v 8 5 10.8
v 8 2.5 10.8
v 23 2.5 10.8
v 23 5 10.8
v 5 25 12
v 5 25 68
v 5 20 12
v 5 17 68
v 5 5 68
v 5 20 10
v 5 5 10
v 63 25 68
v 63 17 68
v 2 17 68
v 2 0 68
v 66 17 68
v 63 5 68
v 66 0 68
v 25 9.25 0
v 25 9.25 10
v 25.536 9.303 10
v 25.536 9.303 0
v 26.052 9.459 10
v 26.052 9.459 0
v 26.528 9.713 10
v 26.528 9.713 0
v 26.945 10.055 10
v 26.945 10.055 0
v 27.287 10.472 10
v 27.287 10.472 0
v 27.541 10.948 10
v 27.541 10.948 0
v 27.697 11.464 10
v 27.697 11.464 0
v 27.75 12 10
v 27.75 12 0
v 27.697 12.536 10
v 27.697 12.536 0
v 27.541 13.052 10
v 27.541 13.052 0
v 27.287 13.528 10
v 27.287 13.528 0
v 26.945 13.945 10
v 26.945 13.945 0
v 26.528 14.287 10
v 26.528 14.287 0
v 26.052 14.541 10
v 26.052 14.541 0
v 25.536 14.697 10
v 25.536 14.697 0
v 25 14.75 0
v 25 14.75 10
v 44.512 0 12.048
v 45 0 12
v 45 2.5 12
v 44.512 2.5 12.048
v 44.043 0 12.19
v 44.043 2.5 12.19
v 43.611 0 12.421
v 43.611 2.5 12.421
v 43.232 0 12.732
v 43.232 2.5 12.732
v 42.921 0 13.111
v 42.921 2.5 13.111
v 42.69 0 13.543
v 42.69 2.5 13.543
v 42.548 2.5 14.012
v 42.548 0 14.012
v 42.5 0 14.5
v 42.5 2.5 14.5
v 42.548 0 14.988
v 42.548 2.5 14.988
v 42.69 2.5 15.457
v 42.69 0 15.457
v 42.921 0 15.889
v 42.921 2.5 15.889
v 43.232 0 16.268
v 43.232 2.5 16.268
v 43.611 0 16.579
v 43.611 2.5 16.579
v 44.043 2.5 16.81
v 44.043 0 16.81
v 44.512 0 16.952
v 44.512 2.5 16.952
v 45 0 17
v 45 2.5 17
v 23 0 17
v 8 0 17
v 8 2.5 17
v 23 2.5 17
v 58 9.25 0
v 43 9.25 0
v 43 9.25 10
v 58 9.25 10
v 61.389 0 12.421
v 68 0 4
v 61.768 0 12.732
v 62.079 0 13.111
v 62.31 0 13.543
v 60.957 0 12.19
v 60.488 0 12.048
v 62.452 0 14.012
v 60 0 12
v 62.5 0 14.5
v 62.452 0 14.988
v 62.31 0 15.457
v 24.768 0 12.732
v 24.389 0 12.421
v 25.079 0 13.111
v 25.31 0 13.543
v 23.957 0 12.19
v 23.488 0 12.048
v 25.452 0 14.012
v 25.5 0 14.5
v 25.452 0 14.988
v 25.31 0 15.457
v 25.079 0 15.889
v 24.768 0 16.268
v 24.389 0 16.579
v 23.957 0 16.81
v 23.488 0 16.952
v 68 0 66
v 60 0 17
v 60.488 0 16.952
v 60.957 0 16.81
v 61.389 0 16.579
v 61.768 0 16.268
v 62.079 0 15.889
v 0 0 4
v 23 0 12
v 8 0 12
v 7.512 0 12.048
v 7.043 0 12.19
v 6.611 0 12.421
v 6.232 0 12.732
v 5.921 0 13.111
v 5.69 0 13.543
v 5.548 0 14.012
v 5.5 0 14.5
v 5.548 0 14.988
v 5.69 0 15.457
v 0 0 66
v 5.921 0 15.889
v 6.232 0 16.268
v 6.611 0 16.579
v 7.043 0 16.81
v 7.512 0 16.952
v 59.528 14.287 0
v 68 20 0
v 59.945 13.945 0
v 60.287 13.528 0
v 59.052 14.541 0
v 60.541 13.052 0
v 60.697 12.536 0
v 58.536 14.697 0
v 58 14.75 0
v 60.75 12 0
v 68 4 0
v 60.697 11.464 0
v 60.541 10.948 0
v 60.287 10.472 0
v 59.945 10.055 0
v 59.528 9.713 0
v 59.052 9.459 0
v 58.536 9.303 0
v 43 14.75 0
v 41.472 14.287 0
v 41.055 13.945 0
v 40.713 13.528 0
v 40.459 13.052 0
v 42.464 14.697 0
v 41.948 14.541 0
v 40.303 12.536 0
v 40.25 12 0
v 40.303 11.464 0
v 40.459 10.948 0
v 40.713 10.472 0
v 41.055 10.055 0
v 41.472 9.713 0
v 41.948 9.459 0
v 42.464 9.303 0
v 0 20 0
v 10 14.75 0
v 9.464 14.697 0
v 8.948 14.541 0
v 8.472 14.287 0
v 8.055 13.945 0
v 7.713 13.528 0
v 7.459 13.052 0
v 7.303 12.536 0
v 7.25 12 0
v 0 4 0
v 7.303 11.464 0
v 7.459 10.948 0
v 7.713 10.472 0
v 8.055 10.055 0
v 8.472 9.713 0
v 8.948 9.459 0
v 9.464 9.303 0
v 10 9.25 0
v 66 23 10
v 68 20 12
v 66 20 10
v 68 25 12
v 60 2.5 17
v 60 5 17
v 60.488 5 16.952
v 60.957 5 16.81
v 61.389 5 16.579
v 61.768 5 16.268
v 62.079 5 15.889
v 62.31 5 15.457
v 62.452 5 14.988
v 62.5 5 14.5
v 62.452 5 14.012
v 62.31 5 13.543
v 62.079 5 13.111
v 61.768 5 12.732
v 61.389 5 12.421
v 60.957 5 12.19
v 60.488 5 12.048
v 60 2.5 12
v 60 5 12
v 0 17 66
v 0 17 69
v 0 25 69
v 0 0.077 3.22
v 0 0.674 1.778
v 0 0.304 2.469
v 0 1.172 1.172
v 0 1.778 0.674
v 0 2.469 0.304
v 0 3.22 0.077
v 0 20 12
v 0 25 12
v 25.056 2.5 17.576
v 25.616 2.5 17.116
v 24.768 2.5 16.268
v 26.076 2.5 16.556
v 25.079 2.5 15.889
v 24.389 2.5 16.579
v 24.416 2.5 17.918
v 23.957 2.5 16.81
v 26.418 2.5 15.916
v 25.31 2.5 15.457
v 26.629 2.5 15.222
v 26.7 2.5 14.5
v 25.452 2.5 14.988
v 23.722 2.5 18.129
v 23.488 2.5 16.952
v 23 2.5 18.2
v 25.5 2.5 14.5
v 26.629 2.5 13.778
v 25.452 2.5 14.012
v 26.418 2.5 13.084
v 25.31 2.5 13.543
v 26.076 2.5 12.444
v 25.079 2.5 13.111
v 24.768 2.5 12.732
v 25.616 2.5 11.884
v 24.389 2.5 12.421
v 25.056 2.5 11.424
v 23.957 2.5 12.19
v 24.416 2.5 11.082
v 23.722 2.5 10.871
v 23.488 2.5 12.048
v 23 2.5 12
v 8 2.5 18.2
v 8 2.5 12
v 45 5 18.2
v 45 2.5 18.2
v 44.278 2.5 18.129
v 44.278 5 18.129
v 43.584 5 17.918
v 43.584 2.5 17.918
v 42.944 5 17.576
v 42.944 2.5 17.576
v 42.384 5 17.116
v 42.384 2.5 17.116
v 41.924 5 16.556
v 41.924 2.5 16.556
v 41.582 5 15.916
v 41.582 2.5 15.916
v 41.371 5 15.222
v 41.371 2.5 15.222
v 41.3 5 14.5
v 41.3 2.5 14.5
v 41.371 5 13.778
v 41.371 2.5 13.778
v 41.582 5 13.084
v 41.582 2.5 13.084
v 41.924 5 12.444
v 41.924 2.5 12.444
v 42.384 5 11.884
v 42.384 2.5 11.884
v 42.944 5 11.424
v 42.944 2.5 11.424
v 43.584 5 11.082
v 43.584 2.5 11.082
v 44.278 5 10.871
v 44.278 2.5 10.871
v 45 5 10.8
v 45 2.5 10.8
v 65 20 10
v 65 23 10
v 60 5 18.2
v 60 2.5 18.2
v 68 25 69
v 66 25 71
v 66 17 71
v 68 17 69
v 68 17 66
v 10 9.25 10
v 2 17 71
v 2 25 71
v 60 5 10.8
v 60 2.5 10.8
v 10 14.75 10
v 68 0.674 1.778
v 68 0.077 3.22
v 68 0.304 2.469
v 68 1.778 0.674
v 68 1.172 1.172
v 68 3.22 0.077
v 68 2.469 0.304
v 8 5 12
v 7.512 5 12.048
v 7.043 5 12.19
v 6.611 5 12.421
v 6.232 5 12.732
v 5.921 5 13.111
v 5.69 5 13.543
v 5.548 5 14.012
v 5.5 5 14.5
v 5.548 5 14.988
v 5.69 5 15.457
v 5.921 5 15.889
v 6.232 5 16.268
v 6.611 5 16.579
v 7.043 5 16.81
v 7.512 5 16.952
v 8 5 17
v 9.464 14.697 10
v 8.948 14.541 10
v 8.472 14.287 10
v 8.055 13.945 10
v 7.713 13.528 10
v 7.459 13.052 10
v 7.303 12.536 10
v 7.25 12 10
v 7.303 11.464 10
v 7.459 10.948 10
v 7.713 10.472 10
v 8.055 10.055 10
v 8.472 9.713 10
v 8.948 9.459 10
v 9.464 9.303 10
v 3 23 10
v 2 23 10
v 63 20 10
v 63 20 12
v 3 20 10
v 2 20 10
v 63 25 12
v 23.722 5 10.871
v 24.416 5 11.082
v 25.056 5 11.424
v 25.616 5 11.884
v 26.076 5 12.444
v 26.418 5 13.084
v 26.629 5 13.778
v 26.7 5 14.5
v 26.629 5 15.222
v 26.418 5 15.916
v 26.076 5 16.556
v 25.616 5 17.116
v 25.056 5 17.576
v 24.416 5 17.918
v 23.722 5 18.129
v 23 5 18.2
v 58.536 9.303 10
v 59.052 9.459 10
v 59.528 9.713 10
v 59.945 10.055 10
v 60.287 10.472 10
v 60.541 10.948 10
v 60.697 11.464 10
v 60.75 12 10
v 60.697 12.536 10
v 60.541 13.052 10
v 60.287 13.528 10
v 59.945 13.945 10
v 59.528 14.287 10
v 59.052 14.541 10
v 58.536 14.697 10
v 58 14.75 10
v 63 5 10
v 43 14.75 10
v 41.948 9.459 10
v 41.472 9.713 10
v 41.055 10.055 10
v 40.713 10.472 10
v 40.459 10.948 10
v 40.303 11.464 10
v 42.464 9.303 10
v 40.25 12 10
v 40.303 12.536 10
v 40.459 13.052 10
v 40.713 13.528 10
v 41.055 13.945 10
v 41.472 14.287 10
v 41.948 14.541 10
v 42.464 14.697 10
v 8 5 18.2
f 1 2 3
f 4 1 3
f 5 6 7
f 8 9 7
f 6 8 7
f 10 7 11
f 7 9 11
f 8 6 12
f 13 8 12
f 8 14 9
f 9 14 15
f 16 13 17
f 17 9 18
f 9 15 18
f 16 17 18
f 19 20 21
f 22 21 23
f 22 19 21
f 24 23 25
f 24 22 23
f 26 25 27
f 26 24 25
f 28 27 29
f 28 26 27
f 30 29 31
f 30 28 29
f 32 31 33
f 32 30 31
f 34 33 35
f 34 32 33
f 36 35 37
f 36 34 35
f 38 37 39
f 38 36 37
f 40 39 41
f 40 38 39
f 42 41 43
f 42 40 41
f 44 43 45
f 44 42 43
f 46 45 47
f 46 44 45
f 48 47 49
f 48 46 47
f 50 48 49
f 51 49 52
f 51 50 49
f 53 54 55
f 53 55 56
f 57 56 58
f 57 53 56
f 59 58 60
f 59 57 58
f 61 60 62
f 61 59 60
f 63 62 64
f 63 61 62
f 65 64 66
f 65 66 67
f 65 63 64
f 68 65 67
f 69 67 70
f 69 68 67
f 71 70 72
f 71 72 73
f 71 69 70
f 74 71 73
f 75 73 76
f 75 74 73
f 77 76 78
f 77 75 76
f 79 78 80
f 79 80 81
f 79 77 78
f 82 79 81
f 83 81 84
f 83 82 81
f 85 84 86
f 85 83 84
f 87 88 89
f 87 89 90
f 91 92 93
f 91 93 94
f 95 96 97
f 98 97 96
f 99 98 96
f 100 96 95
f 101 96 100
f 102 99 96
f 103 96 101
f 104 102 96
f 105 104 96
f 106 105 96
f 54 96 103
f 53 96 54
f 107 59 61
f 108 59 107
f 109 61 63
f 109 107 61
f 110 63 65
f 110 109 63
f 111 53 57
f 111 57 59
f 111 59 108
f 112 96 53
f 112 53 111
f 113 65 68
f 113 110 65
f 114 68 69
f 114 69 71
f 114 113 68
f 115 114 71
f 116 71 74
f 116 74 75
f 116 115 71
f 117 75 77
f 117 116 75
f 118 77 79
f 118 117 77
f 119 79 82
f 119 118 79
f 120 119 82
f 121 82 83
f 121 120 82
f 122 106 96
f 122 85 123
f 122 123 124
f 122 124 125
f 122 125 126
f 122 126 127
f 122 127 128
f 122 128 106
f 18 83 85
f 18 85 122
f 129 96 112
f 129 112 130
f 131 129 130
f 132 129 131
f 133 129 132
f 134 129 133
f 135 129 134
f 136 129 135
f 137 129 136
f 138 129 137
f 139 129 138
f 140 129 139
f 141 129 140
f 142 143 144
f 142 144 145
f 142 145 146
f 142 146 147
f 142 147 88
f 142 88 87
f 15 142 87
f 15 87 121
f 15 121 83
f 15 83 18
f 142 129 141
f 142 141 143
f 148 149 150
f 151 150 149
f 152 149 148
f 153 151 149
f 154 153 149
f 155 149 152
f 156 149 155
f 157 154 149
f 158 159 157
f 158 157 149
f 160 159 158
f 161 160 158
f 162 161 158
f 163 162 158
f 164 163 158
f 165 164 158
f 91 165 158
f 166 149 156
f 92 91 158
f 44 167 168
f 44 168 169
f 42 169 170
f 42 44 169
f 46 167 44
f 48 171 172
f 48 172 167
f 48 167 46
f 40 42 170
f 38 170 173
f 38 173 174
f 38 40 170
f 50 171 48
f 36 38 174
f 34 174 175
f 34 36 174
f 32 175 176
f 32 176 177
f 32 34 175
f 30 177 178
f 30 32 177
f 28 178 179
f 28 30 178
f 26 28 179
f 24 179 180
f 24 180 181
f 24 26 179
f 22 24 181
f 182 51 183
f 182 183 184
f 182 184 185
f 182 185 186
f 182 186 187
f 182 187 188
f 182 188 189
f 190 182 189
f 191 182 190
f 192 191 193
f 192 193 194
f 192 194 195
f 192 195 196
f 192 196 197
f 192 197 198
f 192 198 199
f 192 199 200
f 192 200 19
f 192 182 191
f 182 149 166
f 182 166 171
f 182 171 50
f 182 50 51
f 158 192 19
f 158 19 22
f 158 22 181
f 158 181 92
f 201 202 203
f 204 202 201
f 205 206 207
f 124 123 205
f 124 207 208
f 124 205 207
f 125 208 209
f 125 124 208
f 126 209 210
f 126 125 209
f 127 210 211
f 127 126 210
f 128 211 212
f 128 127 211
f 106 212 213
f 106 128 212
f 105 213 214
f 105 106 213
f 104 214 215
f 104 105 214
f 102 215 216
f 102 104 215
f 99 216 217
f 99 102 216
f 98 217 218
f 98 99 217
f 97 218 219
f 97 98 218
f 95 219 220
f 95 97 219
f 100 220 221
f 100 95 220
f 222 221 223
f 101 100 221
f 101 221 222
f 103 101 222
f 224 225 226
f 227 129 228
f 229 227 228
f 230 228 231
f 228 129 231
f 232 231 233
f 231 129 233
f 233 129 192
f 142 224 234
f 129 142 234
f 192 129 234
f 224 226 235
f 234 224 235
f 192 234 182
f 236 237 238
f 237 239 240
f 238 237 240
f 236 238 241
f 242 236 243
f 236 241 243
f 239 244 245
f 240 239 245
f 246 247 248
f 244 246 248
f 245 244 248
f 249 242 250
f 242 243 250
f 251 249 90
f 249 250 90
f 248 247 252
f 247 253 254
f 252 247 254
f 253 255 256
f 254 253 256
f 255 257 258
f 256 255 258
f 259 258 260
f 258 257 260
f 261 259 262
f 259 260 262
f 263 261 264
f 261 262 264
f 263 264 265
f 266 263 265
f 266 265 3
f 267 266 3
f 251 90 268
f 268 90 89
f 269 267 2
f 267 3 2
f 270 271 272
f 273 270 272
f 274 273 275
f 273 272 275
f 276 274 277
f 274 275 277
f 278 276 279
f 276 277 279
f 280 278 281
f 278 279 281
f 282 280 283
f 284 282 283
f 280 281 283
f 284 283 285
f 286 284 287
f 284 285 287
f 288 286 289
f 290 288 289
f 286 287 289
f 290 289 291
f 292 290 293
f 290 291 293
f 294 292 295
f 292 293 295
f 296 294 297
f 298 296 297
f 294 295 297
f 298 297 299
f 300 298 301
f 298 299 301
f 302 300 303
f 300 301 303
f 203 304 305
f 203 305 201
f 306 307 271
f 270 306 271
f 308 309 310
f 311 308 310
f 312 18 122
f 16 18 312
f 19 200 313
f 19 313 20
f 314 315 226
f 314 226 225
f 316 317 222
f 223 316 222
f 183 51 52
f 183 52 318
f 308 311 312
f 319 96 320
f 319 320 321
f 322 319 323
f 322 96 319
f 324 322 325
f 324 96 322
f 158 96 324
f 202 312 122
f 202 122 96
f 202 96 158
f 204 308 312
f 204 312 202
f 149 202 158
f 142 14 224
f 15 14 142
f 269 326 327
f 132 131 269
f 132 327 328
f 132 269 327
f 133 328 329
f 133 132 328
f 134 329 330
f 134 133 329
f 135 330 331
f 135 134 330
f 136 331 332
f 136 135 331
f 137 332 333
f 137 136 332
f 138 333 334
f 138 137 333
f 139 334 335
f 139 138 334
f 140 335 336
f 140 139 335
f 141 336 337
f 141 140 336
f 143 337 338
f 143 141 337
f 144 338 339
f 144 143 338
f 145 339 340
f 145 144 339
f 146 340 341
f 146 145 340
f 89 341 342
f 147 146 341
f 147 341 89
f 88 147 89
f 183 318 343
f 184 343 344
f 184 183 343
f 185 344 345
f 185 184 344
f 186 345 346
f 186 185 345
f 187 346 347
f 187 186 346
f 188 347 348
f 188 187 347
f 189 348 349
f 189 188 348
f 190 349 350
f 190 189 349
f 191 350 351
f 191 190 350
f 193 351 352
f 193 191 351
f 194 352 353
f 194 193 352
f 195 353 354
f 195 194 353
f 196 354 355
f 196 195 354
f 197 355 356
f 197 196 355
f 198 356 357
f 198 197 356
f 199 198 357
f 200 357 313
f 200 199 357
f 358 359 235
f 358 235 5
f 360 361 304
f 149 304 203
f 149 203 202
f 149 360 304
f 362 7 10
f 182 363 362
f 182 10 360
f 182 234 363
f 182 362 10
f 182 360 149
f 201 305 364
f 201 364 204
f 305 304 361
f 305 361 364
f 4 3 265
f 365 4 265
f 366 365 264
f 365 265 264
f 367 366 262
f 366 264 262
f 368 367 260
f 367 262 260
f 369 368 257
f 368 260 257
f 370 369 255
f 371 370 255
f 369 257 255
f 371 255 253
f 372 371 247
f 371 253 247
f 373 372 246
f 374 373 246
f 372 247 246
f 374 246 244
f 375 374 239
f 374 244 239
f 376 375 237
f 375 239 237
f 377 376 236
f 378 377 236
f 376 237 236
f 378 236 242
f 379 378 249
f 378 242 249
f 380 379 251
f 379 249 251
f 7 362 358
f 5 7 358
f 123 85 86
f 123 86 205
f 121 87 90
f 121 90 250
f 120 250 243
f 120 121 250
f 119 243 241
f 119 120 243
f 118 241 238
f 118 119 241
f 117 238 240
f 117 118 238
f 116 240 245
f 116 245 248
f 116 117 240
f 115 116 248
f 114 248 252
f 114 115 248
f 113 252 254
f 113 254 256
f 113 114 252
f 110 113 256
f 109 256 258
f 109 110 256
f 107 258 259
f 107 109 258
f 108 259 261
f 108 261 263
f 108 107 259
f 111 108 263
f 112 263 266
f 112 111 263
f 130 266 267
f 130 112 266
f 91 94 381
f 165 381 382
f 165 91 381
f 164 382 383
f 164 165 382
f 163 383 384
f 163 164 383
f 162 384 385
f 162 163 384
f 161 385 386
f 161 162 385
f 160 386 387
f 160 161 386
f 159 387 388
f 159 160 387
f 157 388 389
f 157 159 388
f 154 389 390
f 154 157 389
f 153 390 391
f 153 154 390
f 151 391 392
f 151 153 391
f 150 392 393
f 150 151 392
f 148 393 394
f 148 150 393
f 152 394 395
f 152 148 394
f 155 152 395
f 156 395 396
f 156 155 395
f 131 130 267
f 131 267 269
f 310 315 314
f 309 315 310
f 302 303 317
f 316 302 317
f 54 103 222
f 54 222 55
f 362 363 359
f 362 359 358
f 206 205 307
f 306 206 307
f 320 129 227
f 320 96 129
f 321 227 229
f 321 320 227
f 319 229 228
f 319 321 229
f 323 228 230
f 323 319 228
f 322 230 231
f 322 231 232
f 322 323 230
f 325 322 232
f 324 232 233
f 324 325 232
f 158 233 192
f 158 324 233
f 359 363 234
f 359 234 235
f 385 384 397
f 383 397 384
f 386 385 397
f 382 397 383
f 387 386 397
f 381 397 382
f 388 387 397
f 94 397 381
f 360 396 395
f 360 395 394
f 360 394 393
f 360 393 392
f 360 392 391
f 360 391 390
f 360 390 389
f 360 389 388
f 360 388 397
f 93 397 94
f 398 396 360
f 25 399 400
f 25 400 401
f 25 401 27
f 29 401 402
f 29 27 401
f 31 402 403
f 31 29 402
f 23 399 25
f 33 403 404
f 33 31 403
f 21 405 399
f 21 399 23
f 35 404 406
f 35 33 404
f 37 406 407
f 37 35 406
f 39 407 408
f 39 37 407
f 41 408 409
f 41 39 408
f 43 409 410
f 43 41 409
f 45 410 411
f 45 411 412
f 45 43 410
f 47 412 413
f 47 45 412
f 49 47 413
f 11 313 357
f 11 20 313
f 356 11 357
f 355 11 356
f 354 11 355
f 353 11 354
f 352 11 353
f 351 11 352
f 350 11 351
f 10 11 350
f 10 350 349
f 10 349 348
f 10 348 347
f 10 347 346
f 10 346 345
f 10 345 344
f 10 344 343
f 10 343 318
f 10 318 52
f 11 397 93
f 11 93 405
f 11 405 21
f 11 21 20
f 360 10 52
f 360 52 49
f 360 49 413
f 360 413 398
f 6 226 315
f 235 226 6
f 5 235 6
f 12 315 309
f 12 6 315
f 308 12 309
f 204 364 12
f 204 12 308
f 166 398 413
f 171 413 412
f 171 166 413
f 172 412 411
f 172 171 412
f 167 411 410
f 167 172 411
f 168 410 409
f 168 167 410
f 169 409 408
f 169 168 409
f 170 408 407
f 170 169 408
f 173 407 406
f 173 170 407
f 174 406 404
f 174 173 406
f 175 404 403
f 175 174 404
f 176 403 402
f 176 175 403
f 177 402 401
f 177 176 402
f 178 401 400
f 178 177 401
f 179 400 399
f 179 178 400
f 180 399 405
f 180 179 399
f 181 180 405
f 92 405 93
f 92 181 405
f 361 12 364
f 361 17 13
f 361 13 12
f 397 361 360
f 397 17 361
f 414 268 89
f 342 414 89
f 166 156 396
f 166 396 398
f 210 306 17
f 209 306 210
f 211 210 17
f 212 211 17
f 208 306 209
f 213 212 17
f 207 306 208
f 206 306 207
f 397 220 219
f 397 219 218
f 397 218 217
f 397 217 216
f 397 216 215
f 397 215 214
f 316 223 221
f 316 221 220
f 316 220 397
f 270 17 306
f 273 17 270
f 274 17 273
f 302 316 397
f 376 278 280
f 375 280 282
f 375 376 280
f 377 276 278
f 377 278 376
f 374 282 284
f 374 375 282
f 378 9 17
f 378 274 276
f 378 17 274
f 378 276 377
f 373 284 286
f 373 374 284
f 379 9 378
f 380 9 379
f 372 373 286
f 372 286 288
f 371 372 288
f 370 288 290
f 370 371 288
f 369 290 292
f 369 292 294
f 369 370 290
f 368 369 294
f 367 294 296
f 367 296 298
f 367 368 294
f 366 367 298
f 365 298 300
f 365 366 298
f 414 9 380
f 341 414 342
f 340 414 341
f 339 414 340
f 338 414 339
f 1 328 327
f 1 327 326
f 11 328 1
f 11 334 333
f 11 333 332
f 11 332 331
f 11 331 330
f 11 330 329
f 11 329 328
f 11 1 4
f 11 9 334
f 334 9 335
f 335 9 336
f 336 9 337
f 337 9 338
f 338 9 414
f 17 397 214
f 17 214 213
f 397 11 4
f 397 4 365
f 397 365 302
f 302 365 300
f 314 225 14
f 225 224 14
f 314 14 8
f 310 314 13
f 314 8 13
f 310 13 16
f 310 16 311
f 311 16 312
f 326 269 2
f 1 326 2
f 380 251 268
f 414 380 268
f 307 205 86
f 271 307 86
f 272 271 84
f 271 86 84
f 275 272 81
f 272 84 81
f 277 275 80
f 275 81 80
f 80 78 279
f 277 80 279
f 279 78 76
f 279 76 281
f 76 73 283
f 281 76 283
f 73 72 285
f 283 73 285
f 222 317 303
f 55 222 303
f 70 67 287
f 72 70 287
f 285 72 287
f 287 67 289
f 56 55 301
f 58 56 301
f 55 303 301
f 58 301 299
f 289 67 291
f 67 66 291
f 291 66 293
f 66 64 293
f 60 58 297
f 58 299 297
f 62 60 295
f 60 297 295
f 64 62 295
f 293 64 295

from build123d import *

# Parameters (mm, degrees)
EXTRUDE_2_DEPTH     = 68
SKETCH_2_W          = 5
SKETCH_2_H          = 58
EXTRUDE_3_DEPTH     = 20
CUT_EXTRUDE_1_DEPTH = 20
FILLET_1_R          = 4
SKETCH_4_W          = 68
SKETCH_4_H          = 3
EXTRUDE_4_DEPTH     = 8
CHAMFER_1_SIZE      = 2
CUT_EXTRUDE_3_DEPTH = 8
CUT_EXTRUDE_START   = -2.5
CUT_EXTRUDE_4_DEPTH = 2.5


with BuildPart() as part:
    # 草图1 → 凸台-拉伸2 (new body)
    with BuildSketch(Plane(origin=(0, 0, 0), x_dir=(0, 0, -1), z_dir=(1, 0, 0))):
        Polygon((0, 0), (-68, 0), (-68, 5), (-10, 5), (-10, 20), (0, 20), align=None)
    extrude(amount=EXTRUDE_2_DEPTH)

    # 草图2 → 凸台-拉伸3 (add)
    with BuildSketch(Plane(origin=(0, 5, 0), x_dir=(1, 0, 0), z_dir=(0, 1, 0))):
        with Locations((65.5, -39)):
            Rectangle(SKETCH_2_W, SKETCH_2_H)
        with Locations((2.5, -39)):
            Rectangle(SKETCH_2_W, SKETCH_2_H)
    extrude(amount=EXTRUDE_3_DEPTH)

    # 草图3 → 切除-拉伸1 (cut)
    with BuildSketch(Plane(origin=(0, 0, 0), x_dir=(-1, 0, 0), z_dir=(0, 0, -1))):
        with BuildLine():
            Line((-58, 14.75), (-43, 14.75))
            ThreePointArc((-43, 14.75), (-40.25, 12), (-43, 9.25))
            Line((-43, 9.25), (-58, 9.25))
            ThreePointArc((-58, 9.25), (-60.75, 12), (-58, 14.75))
        make_face()
        with BuildLine():
            Line((-25, 14.75), (-10, 14.75))
            ThreePointArc((-10, 14.75), (-7.25, 12), (-10, 9.25))
            Line((-10, 9.25), (-25, 9.25))
            ThreePointArc((-25, 9.25), (-27.75, 12), (-25, 14.75))
        make_face()
    extrude(amount=-CUT_EXTRUDE_1_DEPTH, mode=Mode.SUBTRACT)

    # 圆角1
    fillet_1_edges = [part.edges().sort_by_distance(p)[0] for p in [
        (34, 0, 0),
    ]]
    fillet(fillet_1_edges, radius=FILLET_1_R)

    # 草图4 → 凸台-拉伸4 (add)
    with BuildSketch(Plane(origin=(0, 25, 0), x_dir=(1, 0, 0), z_dir=(0, 1, 0))):
        with Locations((34, -69.5)):
            Rectangle(SKETCH_4_W, SKETCH_4_H)
    extrude(amount=-EXTRUDE_4_DEPTH)

    # 倒角1
    chamfer_1_edges = [part.edges().sort_by_distance(p)[0] for p in [
        (68, 21, 71),
        (0, 21, 71),
        (68, 22.5, 10),
        (63, 22.5, 10),
        (65.5, 25, 10),
        (5, 22.5, 10),
        (0, 22.5, 10),
        (2.5, 25, 10),
        (0, 8.5, 68),
        (68, 8.5, 68),
    ]]
    chamfer(chamfer_1_edges, length=CHAMFER_1_SIZE)

    # 草图5 → 切除-拉伸3 (cut)
    with BuildSketch(Plane.XZ):
        with BuildLine():
            Line((8, 17), (23, 17))
            ThreePointArc((23, 17), (25.5, 14.5), (23, 12))
            Line((23, 12), (8, 12))
            ThreePointArc((8, 12), (5.5, 14.5), (8, 17))
        make_face()
        with BuildLine():
            Line((45, 17), (60, 17))
            ThreePointArc((60, 17), (62.5, 14.5), (60, 12))
            Line((60, 12), (45, 12))
            ThreePointArc((45, 12), (42.5, 14.5), (45, 17))
        make_face()
    extrude(amount=-CUT_EXTRUDE_3_DEPTH, mode=Mode.SUBTRACT)

    # 草图7 → 切除-拉伸4 (cut)
    with BuildSketch(Plane(origin=(0, 5, 0), x_dir=(1, 0, 0), z_dir=(0, 1, 0)).offset(CUT_EXTRUDE_START)):
        with BuildLine():
            Line((23, -18.2), (8, -18.2))
            Line((8, -18.2), (8, -17))
            Line((8, -17), (23, -17))
            ThreePointArc((23, -17), (25.5, -14.5), (23, -12))
            Line((23, -12), (8, -12))
            Line((8, -12), (8, -10.8))
            Line((8, -10.8), (23, -10.8))
            ThreePointArc((23, -10.8), (26.7, -14.5), (23, -18.2))
        make_face()
        with BuildLine():
            Line((45, -10.8), (60, -10.8))
            Line((60, -10.8), (60, -12))
            Line((60, -12), (45, -12))
            ThreePointArc((45, -12), (42.5, -14.5), (45, -17))
            Line((45, -17), (60, -17))
            Line((60, -17), (60, -18.2))
            Line((60, -18.2), (45, -18.2))
            ThreePointArc((45, -18.2), (41.3, -14.5), (45, -10.8))
        make_face()
    extrude(amount=CUT_EXTRUDE_4_DEPTH, mode=Mode.SUBTRACT)


solid = part.part
